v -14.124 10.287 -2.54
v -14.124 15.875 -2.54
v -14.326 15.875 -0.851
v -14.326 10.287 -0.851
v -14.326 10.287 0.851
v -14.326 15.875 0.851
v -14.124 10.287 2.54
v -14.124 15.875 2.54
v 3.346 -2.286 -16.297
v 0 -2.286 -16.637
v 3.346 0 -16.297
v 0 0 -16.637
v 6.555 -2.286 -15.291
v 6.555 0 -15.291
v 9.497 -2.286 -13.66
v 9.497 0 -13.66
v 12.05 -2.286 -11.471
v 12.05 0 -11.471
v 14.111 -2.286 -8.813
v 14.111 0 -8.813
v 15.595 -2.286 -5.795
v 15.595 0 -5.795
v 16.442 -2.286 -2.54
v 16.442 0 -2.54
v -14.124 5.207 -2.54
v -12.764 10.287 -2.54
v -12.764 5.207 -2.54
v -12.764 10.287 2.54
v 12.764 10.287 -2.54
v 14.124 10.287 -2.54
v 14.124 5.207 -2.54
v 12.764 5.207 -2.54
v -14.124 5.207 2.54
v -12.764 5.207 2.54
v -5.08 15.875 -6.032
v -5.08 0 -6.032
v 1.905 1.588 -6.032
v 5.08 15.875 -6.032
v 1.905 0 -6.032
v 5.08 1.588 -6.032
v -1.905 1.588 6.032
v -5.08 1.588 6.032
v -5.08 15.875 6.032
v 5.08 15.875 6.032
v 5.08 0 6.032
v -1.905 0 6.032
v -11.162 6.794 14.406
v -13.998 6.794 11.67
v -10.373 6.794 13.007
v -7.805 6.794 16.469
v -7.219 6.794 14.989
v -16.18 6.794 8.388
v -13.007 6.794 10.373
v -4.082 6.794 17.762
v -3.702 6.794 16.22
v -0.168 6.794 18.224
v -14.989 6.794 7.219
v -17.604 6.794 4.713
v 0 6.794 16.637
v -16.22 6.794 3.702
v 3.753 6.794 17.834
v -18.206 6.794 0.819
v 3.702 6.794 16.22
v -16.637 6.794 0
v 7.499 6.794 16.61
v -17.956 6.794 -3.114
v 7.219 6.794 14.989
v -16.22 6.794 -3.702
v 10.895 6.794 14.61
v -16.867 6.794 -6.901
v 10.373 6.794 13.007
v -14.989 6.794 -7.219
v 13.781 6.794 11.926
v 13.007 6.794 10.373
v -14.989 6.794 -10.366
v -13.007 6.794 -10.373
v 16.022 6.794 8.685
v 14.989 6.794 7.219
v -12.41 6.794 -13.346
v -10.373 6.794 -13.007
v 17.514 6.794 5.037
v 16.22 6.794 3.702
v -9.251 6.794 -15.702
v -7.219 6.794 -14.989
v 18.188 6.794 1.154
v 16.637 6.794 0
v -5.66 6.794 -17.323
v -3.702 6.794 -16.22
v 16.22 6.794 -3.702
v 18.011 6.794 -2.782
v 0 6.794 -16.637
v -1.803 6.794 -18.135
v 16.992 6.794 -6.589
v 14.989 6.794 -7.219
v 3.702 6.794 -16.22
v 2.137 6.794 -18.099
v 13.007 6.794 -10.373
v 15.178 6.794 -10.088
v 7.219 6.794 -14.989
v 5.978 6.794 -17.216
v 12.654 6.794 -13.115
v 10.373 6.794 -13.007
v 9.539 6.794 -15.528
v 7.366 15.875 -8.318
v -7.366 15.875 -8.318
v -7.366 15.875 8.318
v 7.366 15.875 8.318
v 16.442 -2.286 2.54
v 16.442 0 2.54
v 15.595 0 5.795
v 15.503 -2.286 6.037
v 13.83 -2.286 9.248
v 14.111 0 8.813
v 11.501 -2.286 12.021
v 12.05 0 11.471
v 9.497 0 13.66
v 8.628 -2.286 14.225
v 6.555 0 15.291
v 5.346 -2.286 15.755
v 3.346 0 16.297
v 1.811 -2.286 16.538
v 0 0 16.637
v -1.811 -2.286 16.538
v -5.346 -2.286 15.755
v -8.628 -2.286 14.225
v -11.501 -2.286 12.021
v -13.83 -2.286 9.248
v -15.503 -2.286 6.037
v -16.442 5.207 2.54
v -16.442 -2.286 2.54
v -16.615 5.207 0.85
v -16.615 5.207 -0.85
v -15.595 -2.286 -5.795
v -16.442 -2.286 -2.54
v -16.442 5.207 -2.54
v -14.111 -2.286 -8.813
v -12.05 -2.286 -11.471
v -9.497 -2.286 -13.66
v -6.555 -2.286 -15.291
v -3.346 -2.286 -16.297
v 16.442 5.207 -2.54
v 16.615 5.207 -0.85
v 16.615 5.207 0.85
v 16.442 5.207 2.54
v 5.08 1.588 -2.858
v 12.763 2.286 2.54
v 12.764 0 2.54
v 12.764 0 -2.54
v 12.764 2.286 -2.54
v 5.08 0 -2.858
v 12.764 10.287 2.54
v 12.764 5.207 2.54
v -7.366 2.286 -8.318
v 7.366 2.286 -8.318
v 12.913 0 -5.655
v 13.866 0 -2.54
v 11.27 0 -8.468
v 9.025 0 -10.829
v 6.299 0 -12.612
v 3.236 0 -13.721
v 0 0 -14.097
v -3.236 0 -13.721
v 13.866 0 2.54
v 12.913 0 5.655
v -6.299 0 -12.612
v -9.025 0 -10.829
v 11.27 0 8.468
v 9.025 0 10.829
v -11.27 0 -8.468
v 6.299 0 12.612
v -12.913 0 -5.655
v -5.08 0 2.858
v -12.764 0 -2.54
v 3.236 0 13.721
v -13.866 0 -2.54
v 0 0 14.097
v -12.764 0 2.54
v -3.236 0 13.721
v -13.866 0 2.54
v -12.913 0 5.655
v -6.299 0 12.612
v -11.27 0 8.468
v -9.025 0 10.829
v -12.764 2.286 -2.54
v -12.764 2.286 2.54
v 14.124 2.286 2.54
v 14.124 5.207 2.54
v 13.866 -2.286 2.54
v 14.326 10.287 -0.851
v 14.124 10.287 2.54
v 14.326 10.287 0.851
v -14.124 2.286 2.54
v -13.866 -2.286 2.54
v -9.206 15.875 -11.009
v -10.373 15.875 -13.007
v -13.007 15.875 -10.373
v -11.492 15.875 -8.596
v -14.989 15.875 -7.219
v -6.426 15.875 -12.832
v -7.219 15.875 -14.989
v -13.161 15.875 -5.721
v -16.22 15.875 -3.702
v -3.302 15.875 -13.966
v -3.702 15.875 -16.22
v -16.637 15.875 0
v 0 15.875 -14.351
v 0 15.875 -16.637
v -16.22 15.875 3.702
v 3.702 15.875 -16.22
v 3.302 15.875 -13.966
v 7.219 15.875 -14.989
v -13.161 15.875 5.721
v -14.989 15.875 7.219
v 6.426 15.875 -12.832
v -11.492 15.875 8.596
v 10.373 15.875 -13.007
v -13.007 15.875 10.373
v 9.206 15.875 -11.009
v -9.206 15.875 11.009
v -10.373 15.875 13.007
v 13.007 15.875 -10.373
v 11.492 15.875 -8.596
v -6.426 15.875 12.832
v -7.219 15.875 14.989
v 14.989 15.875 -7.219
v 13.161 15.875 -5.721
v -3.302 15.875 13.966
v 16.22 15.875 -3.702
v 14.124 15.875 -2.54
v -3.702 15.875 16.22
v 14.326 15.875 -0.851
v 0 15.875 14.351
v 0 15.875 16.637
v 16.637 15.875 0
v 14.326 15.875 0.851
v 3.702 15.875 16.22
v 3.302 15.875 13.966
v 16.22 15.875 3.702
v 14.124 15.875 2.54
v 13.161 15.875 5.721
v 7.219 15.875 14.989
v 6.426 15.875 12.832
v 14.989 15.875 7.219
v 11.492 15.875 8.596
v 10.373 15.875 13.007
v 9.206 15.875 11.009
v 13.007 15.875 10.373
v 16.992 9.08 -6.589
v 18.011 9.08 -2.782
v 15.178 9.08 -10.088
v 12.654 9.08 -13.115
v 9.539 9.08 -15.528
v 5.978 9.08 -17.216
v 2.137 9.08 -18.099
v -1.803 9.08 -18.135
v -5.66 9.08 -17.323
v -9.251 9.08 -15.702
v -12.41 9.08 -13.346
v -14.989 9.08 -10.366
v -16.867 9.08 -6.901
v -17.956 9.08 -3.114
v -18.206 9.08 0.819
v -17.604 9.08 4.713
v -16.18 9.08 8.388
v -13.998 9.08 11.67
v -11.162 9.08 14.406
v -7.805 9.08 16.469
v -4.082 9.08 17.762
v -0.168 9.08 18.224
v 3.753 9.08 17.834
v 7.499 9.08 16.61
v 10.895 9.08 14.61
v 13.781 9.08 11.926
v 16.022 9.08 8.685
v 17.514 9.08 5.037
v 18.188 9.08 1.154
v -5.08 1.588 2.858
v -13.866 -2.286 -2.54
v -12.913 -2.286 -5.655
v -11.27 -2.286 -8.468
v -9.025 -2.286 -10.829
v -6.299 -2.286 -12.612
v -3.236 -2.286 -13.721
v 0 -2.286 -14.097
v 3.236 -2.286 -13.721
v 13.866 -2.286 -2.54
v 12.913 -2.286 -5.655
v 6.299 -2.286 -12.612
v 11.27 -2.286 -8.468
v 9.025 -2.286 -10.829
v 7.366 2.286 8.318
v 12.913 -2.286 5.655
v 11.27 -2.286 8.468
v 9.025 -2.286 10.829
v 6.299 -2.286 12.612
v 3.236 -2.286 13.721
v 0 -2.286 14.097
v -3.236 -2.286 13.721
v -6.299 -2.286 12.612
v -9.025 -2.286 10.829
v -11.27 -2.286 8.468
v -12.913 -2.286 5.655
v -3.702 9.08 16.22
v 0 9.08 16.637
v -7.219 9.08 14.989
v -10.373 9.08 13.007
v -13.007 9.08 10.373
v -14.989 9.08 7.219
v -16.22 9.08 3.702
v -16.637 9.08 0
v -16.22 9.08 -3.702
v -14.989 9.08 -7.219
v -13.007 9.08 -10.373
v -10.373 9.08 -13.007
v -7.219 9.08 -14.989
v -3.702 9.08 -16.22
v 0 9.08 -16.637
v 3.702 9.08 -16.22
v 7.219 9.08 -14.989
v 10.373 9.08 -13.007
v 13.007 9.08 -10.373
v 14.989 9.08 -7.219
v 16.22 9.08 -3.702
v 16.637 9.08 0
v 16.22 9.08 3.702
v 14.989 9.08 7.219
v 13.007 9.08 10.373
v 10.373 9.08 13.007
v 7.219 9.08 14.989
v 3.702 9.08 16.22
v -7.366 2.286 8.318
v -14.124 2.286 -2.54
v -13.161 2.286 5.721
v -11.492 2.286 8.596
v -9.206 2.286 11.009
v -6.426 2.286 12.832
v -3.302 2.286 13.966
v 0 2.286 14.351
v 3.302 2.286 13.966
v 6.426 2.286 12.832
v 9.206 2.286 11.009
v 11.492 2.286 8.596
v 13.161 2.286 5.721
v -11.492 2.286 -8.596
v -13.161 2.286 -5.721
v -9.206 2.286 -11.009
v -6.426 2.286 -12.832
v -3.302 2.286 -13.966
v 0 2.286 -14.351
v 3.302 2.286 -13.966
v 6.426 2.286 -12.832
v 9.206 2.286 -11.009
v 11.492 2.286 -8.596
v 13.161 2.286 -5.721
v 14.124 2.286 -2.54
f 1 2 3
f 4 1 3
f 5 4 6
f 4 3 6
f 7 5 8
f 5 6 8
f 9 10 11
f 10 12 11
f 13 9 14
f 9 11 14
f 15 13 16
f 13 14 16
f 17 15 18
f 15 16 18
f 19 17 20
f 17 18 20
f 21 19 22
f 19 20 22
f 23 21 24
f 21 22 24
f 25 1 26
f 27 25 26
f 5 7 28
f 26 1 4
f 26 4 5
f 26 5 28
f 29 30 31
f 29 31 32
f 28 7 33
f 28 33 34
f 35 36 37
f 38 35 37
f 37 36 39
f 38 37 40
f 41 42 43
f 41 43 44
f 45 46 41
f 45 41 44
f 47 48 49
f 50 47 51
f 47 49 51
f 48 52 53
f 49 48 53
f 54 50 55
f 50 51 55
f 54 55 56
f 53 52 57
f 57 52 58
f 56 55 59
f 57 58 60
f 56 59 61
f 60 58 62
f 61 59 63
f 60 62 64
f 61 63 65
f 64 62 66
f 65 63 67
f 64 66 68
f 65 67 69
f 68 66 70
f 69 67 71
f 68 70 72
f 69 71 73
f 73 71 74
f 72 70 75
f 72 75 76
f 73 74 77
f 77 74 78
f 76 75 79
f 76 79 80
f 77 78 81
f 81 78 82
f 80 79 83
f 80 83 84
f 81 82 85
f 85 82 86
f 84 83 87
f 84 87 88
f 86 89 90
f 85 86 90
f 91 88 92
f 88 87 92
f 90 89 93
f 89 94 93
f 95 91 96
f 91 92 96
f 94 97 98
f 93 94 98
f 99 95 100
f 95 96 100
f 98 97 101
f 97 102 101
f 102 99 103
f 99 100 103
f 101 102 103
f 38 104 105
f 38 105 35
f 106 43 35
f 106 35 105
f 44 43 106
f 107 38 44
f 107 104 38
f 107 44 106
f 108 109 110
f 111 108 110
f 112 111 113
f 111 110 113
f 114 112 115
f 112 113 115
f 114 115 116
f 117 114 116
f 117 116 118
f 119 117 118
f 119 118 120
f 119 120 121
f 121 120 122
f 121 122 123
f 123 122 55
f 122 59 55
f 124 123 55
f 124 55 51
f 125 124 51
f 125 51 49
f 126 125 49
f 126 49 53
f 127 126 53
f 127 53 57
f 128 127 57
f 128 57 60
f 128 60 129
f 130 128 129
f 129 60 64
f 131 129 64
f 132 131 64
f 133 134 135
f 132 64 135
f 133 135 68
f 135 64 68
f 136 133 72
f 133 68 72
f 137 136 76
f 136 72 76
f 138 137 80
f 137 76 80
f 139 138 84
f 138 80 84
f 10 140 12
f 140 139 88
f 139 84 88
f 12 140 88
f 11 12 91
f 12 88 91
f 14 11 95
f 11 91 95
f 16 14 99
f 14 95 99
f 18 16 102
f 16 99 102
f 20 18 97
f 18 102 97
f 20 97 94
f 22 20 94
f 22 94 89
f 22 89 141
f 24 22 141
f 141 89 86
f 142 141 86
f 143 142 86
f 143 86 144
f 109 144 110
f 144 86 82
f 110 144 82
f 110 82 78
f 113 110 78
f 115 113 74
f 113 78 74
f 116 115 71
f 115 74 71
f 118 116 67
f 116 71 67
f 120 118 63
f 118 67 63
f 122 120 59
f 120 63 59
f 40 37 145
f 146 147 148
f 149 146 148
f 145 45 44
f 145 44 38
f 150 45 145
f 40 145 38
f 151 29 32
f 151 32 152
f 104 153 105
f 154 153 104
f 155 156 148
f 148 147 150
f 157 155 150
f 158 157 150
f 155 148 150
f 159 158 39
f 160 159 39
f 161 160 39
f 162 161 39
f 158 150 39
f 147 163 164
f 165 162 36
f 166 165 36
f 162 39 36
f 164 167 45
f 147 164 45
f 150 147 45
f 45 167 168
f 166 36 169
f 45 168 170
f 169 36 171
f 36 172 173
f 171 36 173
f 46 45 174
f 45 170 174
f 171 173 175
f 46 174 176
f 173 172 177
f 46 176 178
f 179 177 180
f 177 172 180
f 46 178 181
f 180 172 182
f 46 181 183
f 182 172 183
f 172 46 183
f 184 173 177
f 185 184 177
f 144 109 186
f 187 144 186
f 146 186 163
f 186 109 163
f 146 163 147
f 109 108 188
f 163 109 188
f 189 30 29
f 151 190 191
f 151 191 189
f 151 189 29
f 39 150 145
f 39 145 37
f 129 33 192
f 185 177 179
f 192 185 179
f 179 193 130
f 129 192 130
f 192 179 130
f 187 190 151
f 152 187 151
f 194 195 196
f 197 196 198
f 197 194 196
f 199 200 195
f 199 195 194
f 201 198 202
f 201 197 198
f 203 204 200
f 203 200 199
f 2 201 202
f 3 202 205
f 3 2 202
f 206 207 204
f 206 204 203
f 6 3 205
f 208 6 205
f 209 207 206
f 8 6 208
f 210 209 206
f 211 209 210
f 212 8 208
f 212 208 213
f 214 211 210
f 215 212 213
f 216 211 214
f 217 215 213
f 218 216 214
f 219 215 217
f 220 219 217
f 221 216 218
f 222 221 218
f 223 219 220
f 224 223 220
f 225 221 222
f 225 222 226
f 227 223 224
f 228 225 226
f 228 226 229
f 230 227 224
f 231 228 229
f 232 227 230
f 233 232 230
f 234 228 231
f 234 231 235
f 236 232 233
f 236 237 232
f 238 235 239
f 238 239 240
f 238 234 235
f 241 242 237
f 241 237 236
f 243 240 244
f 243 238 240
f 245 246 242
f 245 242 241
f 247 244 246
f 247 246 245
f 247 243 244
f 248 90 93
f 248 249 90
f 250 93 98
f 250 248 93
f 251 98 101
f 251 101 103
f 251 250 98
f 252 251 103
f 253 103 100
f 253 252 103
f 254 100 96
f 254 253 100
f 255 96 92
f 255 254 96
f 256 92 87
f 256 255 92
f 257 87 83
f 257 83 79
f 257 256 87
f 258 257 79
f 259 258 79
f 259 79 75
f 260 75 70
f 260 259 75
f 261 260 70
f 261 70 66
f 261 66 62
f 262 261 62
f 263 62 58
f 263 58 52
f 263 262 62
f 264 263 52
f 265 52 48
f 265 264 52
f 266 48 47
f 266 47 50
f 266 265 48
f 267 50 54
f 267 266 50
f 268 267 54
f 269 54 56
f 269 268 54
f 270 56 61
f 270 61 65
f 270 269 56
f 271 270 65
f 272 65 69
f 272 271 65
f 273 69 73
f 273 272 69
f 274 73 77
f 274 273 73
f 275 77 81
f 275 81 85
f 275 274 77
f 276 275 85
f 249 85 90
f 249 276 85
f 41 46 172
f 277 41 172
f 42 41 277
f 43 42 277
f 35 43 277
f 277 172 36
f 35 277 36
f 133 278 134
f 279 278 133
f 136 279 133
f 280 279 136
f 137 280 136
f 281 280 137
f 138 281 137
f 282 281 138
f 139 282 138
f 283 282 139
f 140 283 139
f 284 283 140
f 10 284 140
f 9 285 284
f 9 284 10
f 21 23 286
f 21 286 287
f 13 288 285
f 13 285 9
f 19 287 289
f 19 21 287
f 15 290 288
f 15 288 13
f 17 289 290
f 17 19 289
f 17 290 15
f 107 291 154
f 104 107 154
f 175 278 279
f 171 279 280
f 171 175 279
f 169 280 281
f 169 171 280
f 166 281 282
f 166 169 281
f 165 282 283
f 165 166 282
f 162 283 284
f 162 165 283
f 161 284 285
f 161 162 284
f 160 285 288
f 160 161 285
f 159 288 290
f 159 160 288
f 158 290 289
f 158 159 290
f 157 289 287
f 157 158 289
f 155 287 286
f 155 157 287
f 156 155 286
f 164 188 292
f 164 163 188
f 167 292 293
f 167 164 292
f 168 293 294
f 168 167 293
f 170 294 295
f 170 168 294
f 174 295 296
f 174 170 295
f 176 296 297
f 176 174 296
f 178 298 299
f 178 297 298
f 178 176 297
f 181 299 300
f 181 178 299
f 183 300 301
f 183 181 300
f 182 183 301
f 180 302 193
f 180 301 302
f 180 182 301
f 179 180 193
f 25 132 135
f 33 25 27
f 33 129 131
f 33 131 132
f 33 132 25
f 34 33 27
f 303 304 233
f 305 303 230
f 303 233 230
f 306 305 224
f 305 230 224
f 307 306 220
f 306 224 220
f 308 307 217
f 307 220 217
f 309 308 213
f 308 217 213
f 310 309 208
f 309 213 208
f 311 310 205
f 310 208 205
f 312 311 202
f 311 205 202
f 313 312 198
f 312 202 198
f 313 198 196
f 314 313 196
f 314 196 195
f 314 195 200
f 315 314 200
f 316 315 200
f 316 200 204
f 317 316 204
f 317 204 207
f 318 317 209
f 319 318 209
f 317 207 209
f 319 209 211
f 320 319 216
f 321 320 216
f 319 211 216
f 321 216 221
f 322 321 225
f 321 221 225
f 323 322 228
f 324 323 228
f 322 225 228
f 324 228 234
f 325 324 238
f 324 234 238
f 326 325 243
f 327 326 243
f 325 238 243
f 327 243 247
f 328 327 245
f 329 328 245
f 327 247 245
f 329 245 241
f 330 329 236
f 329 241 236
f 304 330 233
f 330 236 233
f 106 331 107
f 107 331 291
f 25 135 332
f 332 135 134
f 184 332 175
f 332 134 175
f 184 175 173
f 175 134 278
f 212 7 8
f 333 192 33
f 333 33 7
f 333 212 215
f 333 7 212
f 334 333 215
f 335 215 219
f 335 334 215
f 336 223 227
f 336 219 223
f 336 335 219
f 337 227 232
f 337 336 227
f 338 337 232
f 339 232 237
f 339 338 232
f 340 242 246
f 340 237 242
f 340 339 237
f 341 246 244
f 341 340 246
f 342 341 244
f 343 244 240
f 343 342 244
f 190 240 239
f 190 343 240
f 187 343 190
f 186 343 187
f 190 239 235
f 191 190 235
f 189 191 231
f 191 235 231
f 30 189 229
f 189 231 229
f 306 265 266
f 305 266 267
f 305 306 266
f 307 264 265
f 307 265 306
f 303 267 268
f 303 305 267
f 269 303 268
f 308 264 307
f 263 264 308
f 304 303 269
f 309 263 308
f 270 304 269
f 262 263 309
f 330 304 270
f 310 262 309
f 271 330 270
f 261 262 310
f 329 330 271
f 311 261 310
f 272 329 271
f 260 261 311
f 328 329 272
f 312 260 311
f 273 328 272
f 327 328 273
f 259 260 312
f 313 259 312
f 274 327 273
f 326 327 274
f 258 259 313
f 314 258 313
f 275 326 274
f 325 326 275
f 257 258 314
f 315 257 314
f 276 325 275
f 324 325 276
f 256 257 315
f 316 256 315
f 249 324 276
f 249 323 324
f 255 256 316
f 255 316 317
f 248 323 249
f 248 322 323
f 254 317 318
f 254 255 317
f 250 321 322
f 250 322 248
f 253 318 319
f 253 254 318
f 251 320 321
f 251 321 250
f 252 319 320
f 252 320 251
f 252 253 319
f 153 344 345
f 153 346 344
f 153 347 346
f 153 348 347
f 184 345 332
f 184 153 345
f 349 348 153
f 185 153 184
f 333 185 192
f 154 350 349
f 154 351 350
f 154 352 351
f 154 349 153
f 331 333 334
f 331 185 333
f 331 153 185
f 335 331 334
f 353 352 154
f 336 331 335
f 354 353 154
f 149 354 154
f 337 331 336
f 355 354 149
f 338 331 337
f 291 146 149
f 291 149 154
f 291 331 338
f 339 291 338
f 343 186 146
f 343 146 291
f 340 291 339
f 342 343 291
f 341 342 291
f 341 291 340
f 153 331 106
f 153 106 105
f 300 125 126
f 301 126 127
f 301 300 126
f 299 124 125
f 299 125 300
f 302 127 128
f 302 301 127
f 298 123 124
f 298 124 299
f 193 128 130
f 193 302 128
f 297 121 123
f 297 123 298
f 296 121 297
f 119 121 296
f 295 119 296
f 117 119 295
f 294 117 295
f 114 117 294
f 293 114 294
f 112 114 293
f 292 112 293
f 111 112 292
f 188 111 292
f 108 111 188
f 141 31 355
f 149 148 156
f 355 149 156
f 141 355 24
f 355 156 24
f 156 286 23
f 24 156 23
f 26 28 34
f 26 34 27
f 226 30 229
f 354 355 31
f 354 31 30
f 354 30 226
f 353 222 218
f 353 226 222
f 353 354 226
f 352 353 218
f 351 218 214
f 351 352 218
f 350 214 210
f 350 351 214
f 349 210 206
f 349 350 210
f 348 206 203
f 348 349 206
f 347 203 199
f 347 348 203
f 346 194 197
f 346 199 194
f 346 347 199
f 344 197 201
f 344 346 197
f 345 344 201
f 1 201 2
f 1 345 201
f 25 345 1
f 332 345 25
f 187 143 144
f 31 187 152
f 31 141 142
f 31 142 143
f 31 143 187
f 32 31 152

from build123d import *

# Parameters (mm, degrees)
SKETCH1_R           = 16.637
SKETCH1_W           = 10.16
SKETCH1_H           = 12.065
BOSS_EXTRUDE1_DEPTH = 15.875
SHELL1_T            = -2.286
BOSS_EXTRUDE2_DEPTH = 1.5875
SKETCH3_W           = 1.5875
SKETCH3_H           = 5.08
BOSS_EXTRUDE3_DEPTH = 13.589
SKETCH7_R           = 16.637
SKETCH7_R_2         = 14.097
BOSS_EXTRUDE4_DEPTH = 2.286
CUT_EXTRUDE1_DEPTH  = 7.493
CUT_EXTRUDE2_DEPTH  = 5.588
CIRPATTERN2_COUNT   = 2
SKETCH6_W           = 1.5875
SKETCH6_H           = 2.286


with BuildPart() as part:
    # Sketch1 → Boss-Extrude1 (new body)
    with BuildSketch(Plane(origin=(0, 0, 0), x_dir=(1, 0, 0), z_dir=(0, 1, 0))):
        with Locations(Location((0, 0, 0), (0, 0, 270))):
            Circle(SKETCH1_R)
        Rectangle(SKETCH1_W, SKETCH1_H, mode=Mode.SUBTRACT)
    extrude(amount=BOSS_EXTRUDE1_DEPTH)

    # Shell1
    shell1_openings = [part.faces().sort_by_distance(p)[0] for p in [
        (0, 15.875, -16.166434579),
    ]]
    offset(amount=SHELL1_T, openings=shell1_openings, kind=Kind.INTERSECTION)

    # Sketch2 → Boss-Extrude2 (add)
    with BuildSketch(Plane.XZ):
        Polygon((-5.08, 6.0325), (-1.905, 6.0325), (-5.08, 2.8575), align=None)
        Polygon((5.08, -2.8575), (1.905, -6.0325), (5.08, -6.0325), align=None)
    extrude(amount=-BOSS_EXTRUDE2_DEPTH)

    # Sketch3 → Boss-Extrude3 (add)
    with BuildSketch(Plane(origin=(0, 15.875, 0), x_dir=(1, 0, 0), z_dir=(0, 1, 0))):
        with Locations((-13.55725, 0)):
            Rectangle(SKETCH3_W, SKETCH3_H)
    boss_extrude3 = extrude(amount=-BOSS_EXTRUDE3_DEPTH)

    # Sketch7 → Boss-Extrude4 (add)
    with BuildSketch(Plane.XZ):
        with Locations(Location((0, 0, 0), (0, 0, 270))):
            Circle(SKETCH7_R)
        with Locations(Location((0, 0, 0), (0, 0, 270))):
            Circle(SKETCH7_R_2, mode=Mode.SUBTRACT)
    extrude(amount=BOSS_EXTRUDE4_DEPTH)

    # Sketch4 → Cut-Extrude1 (cut)
    with BuildSketch(Plane.XZ.offset(2.286)):
        with BuildLine():
            Line((-16.44196366, -2.54), (-12.7635, -2.54))
            Line((-12.7635, -2.54), (-12.7635, 2.54))
            Line((-12.7635, 2.54), (-16.44196366, 2.54))
            ThreePointArc((-16.44196366, 2.54), (-16.637, 0), (-16.44196366, -2.54))
        make_face()
    cut_extrude1 = extrude(amount=-CUT_EXTRUDE1_DEPTH, mode=Mode.SUBTRACT)

    # Sketch5 → Cut-Extrude2 (cut)
    with BuildSketch(Plane(origin=(0, 15.875, 0), x_dir=(1, 0, 0), z_dir=(0, 1, 0))):
        with BuildLine():
            Line((-14.124432767, -2.54), (-12.7635, -2.54))
            Line((-12.7635, -2.54), (-12.7635, 2.54))
            Line((-12.7635, 2.54), (-14.124432767, 2.54))
            ThreePointArc((-14.124432767, 2.54), (-14.351, 0), (-14.124432767, -2.54))
        make_face()
    cut_extrude2 = extrude(amount=-CUT_EXTRUDE2_DEPTH, mode=Mode.SUBTRACT)

    # CirPattern2: Boss-Extrude3, Cut-Extrude1, Cut-Extrude2 ×2 about axis
    cirpattern2_axis = Axis((0, 0, 0), (0, 1, 0))
    add([boss_extrude3.rotate(cirpattern2_axis, i * 360 / CIRPATTERN2_COUNT) for i in range(1, CIRPATTERN2_COUNT)])
    add([cut_extrude1.rotate(cirpattern2_axis, i * 360 / CIRPATTERN2_COUNT) for i in range(1, CIRPATTERN2_COUNT)], mode=Mode.SUBTRACT)
    add([cut_extrude2.rotate(cirpattern2_axis, i * 360 / CIRPATTERN2_COUNT) for i in range(1, CIRPATTERN2_COUNT)], mode=Mode.SUBTRACT)

    # Sketch6 → Revolve1 (revolve)
    with BuildSketch(Plane.XY, mode=Mode.PRIVATE) as revolve1_sk:
        with Locations((-17.43075, 7.9375)):
            Rectangle(SKETCH6_W, SKETCH6_H)
    revolve(revolve1_sk.sketch.rotate(Axis((0, 0, 0), (0, 1, 0)), 188.781790598), axis=Axis((0, 0, 0), (0, 1, 0)))


solid = part.part
